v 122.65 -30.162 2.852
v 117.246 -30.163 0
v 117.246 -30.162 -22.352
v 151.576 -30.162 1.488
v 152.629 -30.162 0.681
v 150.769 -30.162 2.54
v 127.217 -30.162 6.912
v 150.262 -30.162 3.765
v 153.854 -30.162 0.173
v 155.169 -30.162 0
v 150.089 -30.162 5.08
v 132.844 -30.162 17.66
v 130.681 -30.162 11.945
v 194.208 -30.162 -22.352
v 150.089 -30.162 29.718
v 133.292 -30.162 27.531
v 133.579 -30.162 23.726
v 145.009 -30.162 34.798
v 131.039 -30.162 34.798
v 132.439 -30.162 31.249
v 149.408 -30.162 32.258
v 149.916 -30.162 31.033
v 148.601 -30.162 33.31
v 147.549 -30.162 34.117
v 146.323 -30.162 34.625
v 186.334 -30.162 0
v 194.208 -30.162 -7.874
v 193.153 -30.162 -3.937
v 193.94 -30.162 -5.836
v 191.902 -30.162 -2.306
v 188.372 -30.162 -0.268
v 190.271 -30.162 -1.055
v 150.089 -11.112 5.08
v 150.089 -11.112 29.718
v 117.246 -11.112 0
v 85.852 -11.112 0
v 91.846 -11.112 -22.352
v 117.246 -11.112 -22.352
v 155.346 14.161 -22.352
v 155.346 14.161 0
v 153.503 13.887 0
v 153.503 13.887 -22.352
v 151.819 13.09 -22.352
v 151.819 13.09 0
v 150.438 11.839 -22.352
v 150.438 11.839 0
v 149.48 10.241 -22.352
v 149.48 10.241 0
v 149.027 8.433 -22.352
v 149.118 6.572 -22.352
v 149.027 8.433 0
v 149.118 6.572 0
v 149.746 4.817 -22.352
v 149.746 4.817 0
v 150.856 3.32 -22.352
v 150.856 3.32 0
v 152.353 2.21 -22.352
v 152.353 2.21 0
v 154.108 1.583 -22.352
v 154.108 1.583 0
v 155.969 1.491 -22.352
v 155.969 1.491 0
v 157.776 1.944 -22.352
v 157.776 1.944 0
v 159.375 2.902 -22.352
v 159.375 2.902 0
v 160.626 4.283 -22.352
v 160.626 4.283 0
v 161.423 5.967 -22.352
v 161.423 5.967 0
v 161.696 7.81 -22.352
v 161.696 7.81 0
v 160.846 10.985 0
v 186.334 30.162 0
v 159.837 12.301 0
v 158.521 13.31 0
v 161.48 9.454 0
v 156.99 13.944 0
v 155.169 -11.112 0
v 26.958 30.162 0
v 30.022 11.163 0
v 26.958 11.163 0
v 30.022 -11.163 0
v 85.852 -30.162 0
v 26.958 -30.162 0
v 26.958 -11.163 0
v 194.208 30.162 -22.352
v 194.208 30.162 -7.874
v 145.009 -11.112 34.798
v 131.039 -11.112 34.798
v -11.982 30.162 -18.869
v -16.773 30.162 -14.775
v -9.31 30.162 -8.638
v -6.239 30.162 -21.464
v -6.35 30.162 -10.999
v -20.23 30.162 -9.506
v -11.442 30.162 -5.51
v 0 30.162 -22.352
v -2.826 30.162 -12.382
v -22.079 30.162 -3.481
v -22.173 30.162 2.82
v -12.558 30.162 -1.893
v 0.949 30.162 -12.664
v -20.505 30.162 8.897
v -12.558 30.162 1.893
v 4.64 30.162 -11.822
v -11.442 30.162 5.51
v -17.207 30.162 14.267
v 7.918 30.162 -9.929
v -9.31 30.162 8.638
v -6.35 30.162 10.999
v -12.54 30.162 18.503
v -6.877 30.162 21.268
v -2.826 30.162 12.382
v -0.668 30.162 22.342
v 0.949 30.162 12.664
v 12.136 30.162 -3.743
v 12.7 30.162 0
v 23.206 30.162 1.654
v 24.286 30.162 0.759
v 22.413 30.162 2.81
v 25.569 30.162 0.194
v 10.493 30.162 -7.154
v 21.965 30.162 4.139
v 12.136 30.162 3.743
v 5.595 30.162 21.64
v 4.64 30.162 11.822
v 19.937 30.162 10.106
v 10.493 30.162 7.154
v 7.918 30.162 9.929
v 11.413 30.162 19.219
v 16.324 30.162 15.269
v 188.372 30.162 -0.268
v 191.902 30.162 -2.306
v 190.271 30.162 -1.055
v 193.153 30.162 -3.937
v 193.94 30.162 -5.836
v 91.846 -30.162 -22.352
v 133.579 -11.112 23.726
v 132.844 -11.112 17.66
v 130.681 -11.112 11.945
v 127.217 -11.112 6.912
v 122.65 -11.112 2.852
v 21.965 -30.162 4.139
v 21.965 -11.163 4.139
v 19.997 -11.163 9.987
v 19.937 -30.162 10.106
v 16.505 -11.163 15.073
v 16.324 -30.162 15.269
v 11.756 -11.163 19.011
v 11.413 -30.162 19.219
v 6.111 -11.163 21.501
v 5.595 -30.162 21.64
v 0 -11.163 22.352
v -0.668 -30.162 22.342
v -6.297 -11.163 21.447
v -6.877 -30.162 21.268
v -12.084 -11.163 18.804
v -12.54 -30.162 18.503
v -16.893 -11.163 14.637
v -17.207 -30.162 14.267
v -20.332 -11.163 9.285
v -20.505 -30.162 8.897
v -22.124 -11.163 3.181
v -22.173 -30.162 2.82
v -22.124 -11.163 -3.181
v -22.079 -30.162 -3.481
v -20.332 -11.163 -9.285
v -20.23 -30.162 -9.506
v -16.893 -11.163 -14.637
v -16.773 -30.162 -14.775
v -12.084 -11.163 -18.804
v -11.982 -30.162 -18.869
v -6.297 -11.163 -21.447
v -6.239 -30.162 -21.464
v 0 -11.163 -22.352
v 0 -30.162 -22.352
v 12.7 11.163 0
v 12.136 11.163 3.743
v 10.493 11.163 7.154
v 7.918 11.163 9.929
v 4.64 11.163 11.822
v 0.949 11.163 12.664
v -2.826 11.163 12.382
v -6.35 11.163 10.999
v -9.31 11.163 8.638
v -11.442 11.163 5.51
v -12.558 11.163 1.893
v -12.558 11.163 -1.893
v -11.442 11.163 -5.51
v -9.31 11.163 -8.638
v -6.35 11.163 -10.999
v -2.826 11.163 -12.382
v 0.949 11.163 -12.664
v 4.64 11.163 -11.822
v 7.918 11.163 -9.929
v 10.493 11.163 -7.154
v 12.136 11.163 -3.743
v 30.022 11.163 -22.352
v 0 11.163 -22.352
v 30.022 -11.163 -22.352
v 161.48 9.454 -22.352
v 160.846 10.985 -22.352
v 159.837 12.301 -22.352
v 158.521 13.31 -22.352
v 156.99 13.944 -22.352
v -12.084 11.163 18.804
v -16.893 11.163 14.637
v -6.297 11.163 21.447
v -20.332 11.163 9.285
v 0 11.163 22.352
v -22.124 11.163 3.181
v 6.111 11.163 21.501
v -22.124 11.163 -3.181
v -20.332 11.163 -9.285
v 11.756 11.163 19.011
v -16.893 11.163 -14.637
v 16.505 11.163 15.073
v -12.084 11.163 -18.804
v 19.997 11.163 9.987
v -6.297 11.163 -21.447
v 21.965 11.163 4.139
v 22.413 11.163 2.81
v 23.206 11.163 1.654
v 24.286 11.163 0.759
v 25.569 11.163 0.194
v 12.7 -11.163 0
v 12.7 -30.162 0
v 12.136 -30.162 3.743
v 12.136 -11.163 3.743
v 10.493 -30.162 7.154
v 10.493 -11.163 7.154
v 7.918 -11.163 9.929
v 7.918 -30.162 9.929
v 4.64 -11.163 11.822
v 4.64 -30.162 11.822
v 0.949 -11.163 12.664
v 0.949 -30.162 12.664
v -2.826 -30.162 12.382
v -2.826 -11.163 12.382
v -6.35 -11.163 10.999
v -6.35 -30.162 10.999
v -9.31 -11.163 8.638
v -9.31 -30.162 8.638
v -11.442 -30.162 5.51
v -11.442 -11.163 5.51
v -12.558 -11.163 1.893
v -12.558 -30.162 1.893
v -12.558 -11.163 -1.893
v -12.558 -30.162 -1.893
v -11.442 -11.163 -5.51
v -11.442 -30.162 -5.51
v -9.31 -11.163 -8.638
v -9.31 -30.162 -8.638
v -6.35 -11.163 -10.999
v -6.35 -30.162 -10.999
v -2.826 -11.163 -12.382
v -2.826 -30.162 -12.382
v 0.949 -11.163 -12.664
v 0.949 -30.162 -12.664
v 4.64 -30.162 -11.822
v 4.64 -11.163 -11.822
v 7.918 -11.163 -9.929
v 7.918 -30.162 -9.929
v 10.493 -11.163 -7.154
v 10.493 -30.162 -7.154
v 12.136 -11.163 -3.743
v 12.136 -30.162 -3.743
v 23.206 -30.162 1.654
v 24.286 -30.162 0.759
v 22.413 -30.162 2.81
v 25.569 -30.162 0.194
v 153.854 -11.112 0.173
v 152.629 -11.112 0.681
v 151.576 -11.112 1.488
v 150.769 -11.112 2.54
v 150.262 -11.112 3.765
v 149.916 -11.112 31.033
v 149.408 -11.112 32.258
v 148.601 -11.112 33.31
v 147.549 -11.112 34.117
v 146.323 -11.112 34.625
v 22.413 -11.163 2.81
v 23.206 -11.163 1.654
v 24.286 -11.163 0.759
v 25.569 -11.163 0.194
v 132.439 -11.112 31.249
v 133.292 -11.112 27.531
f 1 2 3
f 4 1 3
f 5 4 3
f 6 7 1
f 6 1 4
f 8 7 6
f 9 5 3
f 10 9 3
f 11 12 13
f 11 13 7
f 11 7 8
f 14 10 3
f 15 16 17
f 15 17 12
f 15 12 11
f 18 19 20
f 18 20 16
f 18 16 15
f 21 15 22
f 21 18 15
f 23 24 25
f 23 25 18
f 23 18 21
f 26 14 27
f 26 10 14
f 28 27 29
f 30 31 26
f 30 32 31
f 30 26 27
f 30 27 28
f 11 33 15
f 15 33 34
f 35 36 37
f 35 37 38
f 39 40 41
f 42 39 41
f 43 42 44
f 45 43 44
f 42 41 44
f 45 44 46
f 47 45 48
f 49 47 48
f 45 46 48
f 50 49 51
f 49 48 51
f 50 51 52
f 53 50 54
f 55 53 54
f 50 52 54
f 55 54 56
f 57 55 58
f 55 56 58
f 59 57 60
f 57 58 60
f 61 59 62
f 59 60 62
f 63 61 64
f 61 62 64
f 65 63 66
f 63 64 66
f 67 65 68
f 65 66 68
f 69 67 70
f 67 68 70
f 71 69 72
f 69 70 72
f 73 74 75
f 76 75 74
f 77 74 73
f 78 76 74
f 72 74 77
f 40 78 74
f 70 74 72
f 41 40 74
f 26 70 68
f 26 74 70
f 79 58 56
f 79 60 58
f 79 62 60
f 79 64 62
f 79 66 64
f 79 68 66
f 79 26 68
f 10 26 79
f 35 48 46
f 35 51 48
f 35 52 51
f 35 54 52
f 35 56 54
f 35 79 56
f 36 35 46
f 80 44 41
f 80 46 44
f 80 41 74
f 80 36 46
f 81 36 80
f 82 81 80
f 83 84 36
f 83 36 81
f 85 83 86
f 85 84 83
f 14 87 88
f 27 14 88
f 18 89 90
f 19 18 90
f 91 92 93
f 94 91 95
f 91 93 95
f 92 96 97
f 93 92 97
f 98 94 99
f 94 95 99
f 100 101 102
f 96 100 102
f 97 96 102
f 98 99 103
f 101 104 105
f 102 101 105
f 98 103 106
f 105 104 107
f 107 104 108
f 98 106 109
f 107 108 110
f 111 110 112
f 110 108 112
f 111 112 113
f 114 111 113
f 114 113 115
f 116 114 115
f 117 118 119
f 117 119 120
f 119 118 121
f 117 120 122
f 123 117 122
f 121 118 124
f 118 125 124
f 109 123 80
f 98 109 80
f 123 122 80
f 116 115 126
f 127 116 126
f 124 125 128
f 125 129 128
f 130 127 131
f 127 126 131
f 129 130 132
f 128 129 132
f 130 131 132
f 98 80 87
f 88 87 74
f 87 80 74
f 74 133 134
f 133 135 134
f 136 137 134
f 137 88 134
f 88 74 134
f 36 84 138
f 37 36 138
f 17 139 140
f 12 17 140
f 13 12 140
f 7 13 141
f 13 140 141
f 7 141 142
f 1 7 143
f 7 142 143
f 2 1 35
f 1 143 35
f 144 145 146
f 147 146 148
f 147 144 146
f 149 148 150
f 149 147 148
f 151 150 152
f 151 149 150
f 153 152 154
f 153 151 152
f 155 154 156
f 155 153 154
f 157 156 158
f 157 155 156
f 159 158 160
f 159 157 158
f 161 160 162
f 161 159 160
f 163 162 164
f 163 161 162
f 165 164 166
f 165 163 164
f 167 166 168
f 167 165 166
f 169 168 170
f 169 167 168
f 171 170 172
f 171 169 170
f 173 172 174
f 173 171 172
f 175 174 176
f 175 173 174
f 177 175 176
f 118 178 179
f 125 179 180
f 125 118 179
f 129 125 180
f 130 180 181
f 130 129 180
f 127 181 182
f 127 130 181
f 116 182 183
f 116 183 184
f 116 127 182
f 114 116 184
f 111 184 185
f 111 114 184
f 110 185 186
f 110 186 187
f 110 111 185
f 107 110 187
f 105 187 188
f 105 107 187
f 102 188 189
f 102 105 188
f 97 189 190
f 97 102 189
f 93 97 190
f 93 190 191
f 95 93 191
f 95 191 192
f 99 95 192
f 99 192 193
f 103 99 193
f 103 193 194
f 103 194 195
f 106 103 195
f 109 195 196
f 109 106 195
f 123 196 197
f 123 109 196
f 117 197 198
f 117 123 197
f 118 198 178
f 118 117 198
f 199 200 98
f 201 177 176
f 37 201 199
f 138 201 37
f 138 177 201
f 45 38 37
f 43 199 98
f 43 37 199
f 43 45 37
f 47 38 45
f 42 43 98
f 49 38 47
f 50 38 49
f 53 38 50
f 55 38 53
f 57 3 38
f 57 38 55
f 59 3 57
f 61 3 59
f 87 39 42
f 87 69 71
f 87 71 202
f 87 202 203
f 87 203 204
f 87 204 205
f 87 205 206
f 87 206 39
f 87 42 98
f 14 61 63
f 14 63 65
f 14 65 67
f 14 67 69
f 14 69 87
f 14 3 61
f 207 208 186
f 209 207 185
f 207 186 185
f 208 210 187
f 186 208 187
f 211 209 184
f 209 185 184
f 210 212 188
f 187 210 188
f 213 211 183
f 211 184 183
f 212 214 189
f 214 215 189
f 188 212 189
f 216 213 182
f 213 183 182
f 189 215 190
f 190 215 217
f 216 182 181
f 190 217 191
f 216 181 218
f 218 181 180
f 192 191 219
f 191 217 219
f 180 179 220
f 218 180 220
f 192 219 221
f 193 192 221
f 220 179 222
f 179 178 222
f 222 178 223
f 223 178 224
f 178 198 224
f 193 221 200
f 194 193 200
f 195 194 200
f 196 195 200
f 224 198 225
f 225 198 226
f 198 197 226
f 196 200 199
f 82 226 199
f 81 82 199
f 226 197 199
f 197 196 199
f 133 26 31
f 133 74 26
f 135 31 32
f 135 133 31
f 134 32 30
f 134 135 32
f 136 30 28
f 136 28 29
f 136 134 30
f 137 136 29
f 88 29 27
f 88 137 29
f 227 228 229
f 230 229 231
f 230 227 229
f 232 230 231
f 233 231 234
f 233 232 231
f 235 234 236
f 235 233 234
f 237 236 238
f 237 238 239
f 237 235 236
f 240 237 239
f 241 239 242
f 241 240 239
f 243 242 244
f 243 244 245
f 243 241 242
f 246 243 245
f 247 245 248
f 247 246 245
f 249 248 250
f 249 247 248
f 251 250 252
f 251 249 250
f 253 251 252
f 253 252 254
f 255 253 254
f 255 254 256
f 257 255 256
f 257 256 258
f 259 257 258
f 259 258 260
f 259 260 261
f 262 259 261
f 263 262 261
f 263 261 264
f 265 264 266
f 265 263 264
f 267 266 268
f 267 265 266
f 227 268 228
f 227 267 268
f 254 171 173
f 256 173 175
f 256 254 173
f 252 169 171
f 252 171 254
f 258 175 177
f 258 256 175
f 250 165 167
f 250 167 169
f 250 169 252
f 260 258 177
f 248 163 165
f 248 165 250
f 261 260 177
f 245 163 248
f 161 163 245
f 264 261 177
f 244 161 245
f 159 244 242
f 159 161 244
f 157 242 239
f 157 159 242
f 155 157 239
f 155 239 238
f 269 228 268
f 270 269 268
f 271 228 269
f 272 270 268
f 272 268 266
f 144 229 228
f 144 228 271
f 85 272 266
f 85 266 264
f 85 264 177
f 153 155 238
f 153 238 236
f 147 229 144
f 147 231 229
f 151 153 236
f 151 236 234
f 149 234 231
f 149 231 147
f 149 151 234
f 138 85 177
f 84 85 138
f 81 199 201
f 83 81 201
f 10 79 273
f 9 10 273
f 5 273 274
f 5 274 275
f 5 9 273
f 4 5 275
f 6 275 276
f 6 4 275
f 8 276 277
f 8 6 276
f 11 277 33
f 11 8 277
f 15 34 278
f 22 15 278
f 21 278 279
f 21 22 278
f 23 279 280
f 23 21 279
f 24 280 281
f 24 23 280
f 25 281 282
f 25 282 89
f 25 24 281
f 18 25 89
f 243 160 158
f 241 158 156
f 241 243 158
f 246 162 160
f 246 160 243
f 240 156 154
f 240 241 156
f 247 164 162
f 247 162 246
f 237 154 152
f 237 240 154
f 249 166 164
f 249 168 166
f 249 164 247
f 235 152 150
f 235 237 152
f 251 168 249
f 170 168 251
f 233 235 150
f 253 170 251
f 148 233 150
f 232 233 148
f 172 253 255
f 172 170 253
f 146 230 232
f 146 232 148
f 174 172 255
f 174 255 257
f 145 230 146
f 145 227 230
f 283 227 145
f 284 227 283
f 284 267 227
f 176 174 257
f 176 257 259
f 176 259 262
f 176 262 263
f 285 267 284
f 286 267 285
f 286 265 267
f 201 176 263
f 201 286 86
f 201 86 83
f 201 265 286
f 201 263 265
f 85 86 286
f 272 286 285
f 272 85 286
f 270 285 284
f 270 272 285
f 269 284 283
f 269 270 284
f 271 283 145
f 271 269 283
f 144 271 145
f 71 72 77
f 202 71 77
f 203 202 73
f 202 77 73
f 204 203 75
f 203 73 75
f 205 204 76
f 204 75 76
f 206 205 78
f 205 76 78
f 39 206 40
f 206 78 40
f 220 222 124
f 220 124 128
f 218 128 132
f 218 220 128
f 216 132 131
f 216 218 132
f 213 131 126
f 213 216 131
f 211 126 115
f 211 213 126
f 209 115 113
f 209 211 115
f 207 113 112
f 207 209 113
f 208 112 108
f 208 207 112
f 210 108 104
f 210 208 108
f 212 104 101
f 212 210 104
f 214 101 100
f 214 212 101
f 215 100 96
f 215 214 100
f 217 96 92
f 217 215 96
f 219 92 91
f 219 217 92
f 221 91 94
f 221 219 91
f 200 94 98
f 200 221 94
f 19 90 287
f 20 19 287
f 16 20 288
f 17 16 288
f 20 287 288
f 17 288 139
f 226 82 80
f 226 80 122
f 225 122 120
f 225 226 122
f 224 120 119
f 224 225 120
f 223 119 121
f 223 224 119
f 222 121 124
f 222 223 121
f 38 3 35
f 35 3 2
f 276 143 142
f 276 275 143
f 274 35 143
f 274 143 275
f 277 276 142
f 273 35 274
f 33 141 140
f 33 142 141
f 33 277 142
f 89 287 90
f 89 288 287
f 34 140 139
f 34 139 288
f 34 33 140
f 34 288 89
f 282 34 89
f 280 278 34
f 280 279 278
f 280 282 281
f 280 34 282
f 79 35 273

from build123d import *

# Parameters (mm, degrees)
F0_R      = 12.7
F1_DEPTH  = 30.1625
F2_DEPTH  = 30.1625
F3_DEPTH  = 30.1625
F5_DEPTH  = 19.05
F6_W      = 11.1125
F6_H      = 34.798
F7_DEPTH  = 50.8
F9_DEPTH  = 50.8
F10_R     = 7.874
F11_R     = 5.08
F12_R     = 5.08
F13_R     = 5.08
F14_W     = 51.4268837869
F14_H     = 22.3266
F15_DEPTH = 50.8
F16_W     = 22.3266
F16_H     = 9.652
F16_H_2   = 12.7
F17_DEPTH = 25.4
F18_DEPTH = 50.8
F19_W     = 12.7
F19_H     = 22.3266
F20_DEPTH = 25.4
F21_W     = 4.6221852958
F21_H     = 22.3266
F22_DEPTH = 25.4


with BuildPart() as f1:
    # F0 (on Front) → F1 (new body)
    with BuildSketch(Plane.XZ):
        with BuildLine():
            Line((85.852, 0), (22.352, 0))
            ThreePointArc((22.352, 0), (-15.8052507731, 15.8052507731), (0, -22.352))
            Line((0, -22.352), (91.8464, -22.352))
            Line((91.8464, -22.352), (85.852, 0))
        make_face()
        Circle(F0_R, mode=Mode.SUBTRACT)
        with BuildLine():
            Line((99.1109187887, 0), (85.852, 0))
            Line((85.852, 0), (91.8464, -22.352))
            Line((91.8464, -22.352), (117.2464, -22.352))
            Line((117.2464, -22.352), (117.2464, 0))
            ThreePointArc((117.2464, 0), (108.1786593943, -1.6737259497), (99.1109187887, 0))
        make_face()
        with BuildLine():
            Line((117.2464, 0), (99.1109187887, 0))
            ThreePointArc((99.1109187887, 0), (108.1786593943, -1.6737259497), (117.2464, 0))
        make_face()
        Polygon((117.2464, 0), (117.2464, -22.352), (194.2084, -22.352), (194.2084, 0), (150.0886, 0), align=None)
        with BuildLine():
            ThreePointArc((133.5786593943, 23.7262740503), (129.1009036739, 9.3242014804), (117.2464, 0))
            Line((117.2464, 0), (150.0886, 0))
            Line((150.0886, 0), (150.0886, 34.798))
            Line((150.0886, 34.798), (131.0386, 34.798))
            ThreePointArc((131.0386, 34.798), (132.9355017958, 29.4059531176), (133.5786593943, 23.7262740503))
        make_face()
    extrude(amount=F1_DEPTH)

    # F0 (on Front) → F2 (join)
    with BuildSketch(Plane.XZ):
        Polygon((117.2464, 0), (117.2464, -22.352), (194.2084, -22.352), (194.2084, 0), (150.0886, 0), align=None)
    extrude(amount=-F2_DEPTH)

    # F3 (add): a face of the model
    f3_faces = [f1.faces().sort_by_distance(p)[0] for p in [
        (45.5494625665, 0, -7.7681891644),
    ]]
    extrude(f3_faces, amount=F3_DEPTH)

    # F4 (on face) → F5 (cut)
    with BuildSketch(Plane.XZ.offset(30.1625)):
        Polygon((85.852, 0), (91.8464, -22.352), (117.2464, -22.352), (117.2464, 0), align=None)
    extrude(amount=-F5_DEPTH, mode=Mode.SUBTRACT)

    # F6 (on face) → F7 (cut)
    with BuildSketch(Plane.YZ.offset(150.0886)):
        with Locations((-5.55625, 17.399)):
            Rectangle(F6_W, F6_H)
    extrude(amount=-F7_DEPTH, mode=Mode.SUBTRACT)

    # F8 (on face) → F9 (cut)
    with BuildSketch(Plane.XY):
        with BuildLine():
            ThreePointArc((161.6964, 7.8105), (159.8365280605, 12.3006280605), (155.3464, 14.1605))
            ThreePointArc((155.3464, 14.1605), (150.8562719395, 3.3203719395), (161.6964, 7.8105))
        make_face()
    extrude(amount=-F9_DEPTH, mode=Mode.SUBTRACT)

    # F10
    f10_edges = [f1.edges().sort_by_distance(p)[0] for p in [
        (194.2084, 0, 0),
    ]]
    fillet(f10_edges, radius=F10_R)

    # F11
    f11_edges = [f1.edges().sort_by_distance(p)[0] for p in [
        (150.0886, -20.6375, 34.798),
    ]]
    fillet(f11_edges, radius=F11_R)

    # F12
    f12_edges = [f1.edges().sort_by_distance(p)[0] for p in [
        (22.352, 0, 0),
    ]]
    fillet(f12_edges, radius=F12_R)

    # F13
    f13_edges = [f1.edges().sort_by_distance(p)[0] for p in [
        (150.0886, -20.6375, 0),
    ]]
    fillet(f13_edges, radius=F13_R)

    # F14 (on face) → F15 (cut)
    with BuildSketch(Plane(origin=(0, 0, -22.352), x_dir=(1, 0, 0), z_dir=(0, 0, -1))):
        with Locations((-25.7134418935, 0)):
            Rectangle(F14_W, F14_H)
    extrude(amount=-F15_DEPTH, mode=Mode.SUBTRACT)

    # F16 (on face) → F17 (cut)
    with BuildSketch(Plane(origin=(0, 0, 0), x_dir=(0, -1, 0), z_dir=(-1, 0, 0))):
        with Locations((0, 17.526)):
            Rectangle(F16_W, F16_H)
        with Locations((0, 6.35)):
            Rectangle(F16_W, F16_H_2)
    extrude(amount=-F17_DEPTH, mode=Mode.SUBTRACT)

    # F18 (cut): a face of the model
    f18_faces = [f1.faces().sort_by_distance(p)[0] for p in [
        (19.05, 0, 0),
    ]]
    extrude(f18_faces, amount=-F18_DEPTH, mode=Mode.SUBTRACT)

    # F19 (on face) → F20 (cut)
    with BuildSketch(Plane(origin=(0, 0, -22.352), x_dir=(1, 0, 0), z_dir=(0, 0, -1))):
        with Locations((6.35, 0)):
            Rectangle(F19_W, F19_H)
    extrude(amount=-F20_DEPTH, mode=Mode.SUBTRACT)

    # F21 (on face) → F22 (cut)
    with BuildSketch(Plane(origin=(0, 0, -22.352), x_dir=(1, 0, 0), z_dir=(0, 0, -1))):
        with Locations((27.7110926479, 0)):
            Rectangle(F21_W, F21_H)
    extrude(amount=-F22_DEPTH, mode=Mode.SUBTRACT)


solid = f1.part
